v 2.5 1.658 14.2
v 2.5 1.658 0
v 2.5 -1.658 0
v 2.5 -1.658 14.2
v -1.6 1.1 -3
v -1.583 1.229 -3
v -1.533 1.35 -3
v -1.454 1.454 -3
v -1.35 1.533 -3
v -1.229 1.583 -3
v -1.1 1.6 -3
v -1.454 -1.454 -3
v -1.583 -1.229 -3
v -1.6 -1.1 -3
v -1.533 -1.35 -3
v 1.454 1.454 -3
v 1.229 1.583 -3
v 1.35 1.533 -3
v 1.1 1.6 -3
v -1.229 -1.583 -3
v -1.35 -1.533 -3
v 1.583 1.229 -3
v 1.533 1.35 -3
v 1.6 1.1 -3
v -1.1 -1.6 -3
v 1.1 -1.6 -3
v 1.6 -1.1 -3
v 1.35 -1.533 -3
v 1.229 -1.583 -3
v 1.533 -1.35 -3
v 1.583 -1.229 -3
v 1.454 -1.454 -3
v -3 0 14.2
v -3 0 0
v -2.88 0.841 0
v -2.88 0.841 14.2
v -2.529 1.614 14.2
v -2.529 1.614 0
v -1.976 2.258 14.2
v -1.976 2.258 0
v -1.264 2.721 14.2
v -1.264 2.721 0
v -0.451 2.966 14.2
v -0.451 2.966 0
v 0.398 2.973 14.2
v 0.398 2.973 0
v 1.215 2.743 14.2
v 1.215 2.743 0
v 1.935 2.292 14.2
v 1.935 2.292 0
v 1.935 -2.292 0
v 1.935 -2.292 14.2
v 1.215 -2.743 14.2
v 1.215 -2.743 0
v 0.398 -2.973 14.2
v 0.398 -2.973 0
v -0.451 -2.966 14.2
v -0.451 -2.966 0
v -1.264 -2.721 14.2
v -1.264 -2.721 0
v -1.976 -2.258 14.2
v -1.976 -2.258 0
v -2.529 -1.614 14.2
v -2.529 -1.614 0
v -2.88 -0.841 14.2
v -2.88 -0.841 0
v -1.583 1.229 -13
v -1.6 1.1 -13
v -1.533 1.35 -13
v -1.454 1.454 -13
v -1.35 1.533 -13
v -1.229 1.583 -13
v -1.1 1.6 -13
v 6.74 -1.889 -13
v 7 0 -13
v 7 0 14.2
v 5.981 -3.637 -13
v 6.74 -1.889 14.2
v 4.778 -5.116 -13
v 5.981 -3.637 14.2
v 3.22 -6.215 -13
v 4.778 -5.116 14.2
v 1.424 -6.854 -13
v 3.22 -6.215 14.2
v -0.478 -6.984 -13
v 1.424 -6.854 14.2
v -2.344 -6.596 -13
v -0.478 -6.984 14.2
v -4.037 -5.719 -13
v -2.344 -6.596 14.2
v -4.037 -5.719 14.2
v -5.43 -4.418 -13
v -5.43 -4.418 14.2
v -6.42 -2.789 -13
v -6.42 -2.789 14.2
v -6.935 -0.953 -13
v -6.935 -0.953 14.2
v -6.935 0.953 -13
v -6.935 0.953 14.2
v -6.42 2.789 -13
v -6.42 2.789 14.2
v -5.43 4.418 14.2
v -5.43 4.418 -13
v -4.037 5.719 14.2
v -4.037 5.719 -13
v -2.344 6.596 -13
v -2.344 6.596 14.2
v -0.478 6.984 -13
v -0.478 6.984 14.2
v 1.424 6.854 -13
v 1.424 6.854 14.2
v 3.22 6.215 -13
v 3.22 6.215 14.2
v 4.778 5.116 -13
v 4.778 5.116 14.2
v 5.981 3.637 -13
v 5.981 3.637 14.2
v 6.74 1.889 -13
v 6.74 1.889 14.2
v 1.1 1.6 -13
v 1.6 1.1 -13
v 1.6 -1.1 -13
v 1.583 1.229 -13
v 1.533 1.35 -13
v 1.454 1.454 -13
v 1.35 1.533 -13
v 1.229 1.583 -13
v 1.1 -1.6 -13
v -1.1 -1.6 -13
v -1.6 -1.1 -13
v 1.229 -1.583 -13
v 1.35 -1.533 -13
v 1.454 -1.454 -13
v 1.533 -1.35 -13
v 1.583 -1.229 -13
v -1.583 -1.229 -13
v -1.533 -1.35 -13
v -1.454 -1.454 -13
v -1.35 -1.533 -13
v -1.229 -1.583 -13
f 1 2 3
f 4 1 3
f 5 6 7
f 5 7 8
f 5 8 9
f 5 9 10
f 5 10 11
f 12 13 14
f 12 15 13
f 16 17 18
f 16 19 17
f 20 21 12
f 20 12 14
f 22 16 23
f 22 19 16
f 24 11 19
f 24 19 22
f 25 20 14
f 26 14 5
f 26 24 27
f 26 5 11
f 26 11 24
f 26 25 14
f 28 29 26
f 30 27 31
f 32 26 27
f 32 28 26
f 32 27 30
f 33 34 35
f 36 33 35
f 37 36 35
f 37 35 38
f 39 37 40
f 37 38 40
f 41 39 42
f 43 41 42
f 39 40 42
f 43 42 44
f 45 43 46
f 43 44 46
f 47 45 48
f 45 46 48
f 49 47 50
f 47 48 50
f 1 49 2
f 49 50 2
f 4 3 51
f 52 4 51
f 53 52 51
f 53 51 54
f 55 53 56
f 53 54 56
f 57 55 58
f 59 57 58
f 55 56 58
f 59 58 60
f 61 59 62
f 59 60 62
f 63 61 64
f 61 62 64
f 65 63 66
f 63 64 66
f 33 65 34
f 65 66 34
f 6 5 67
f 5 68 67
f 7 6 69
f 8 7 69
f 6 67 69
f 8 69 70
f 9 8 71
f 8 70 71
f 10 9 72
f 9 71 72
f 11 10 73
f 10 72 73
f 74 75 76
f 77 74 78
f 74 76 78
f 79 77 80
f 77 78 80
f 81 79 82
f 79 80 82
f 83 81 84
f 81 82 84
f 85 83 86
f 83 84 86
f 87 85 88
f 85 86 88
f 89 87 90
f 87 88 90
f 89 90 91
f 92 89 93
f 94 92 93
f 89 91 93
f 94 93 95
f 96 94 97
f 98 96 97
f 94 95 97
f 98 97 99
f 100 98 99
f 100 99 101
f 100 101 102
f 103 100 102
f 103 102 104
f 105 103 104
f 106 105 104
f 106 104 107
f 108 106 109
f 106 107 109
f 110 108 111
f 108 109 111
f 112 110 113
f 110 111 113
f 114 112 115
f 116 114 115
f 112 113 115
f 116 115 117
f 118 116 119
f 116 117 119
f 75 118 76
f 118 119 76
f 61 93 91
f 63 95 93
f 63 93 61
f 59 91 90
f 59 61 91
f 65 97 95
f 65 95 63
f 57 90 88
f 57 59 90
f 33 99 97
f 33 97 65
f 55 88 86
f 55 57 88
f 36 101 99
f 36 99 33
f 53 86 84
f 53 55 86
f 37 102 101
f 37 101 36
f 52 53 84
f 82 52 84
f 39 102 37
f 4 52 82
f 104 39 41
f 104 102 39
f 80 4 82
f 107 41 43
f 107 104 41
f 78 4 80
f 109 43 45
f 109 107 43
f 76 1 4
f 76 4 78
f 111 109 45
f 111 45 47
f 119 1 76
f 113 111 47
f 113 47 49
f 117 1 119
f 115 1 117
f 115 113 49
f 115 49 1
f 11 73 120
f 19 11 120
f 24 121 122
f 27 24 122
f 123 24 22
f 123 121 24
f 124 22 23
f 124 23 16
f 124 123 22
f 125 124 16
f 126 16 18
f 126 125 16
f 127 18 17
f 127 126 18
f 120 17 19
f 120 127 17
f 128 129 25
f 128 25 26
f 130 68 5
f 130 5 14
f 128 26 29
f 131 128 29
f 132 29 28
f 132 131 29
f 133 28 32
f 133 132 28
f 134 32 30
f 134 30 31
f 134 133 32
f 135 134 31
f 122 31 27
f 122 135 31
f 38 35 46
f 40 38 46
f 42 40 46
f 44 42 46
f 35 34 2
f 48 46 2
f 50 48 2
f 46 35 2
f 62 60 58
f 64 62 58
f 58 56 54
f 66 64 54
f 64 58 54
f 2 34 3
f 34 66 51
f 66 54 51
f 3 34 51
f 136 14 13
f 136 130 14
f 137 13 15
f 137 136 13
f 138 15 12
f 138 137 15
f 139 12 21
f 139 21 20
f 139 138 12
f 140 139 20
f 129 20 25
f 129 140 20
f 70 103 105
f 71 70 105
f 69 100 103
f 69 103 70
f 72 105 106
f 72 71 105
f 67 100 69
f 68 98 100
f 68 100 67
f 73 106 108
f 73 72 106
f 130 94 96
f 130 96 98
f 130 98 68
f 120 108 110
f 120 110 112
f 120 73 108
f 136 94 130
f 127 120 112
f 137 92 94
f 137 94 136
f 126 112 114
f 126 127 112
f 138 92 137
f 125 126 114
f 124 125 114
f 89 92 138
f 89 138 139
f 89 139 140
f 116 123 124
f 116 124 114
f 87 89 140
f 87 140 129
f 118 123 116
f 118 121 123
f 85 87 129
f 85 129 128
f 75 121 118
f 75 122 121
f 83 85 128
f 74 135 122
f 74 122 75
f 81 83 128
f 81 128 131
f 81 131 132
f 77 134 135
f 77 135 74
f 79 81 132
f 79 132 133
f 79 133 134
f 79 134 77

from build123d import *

# Parameters (mm, degrees)
F0_R     = 7
F1_DEPTH = 14.2
F2_R     = 7
F2_R_2   = 5
F3_DEPTH = 3
F4_R     = 7
F4_R_2   = 5
F4_W     = 3.2
F4_H     = 3.2
F5_DEPTH = 10
F6_R     = 0.5


with BuildPart() as f1:
    # F0 (on Top) → F1 (new body)
    with BuildSketch(Plane.XY):
        Circle(F0_R)
        with BuildLine():
            ThreePointArc((2.5, 1.6583123952), (2.8722813233, 0.8660254038), (3, 0))
            ThreePointArc((3, 0), (2.8722813233, -0.8660254038), (2.5, -1.6583123952))
            ThreePointArc((2.5, -1.6583123952), (-0.8660254038, -2.8722813233), (-3, 0))
            ThreePointArc((-3, 0), (-0.8660254038, 2.8722813233), (2.5, 1.6583123952))
        make_face(mode=Mode.SUBTRACT)
        with BuildLine():
            ThreePointArc((2.5, -1.6583123952), (2.8722813233, -0.8660254038), (3, 0))
            ThreePointArc((3, 0), (2.8722813233, 0.8660254038), (2.5, 1.6583123952))
            Line((2.5, 1.6583123952), (2.5, 0))
            Line((2.5, 0), (2.5, -1.6583123952))
        make_face()
    extrude(amount=F1_DEPTH)

    # F2 (on face) → F3 (join)
    with BuildSketch(Plane(origin=(0, 0, 0), x_dir=(1, 0, 0), z_dir=(0, 0, -1))):
        Circle(F2_R)
        Circle(F2_R_2, mode=Mode.SUBTRACT)
        Circle(F2_R_2)
        with BuildLine():
            ThreePointArc((2.5, -1.6583123952), (-3, 0), (2.5, 1.6583123952))
            Line((2.5, 1.6583123952), (2.5, -1.6583123952))
        make_face(mode=Mode.SUBTRACT)
        with BuildLine():
            Line((2.5, -1.6583123952), (2.5, 1.6583123952))
            ThreePointArc((2.5, 1.6583123952), (-3, 0), (2.5, -1.6583123952))
        make_face()
    extrude(amount=F3_DEPTH)

    # F4 (on face) → F5 (join)
    with BuildSketch(Plane(origin=(0, 0, -3), x_dir=(1, 0, 0), z_dir=(0, 0, -1))):
        Circle(F4_R)
        Circle(F4_R_2, mode=Mode.SUBTRACT)
        Circle(F4_R_2)
        Rectangle(F4_W, F4_H, mode=Mode.SUBTRACT)
    extrude(amount=F5_DEPTH)

    # F6
    f6_edges = [f1.edges().sort_by_distance(p)[0] for p in [
        (-1.6, -1.6, -8),
        (-1.6, 1.6, -8),
        (1.6, -1.6, -8),
        (1.6, 1.6, -8),
    ]]
    fillet(f6_edges, radius=F6_R)


solid = f1.part
